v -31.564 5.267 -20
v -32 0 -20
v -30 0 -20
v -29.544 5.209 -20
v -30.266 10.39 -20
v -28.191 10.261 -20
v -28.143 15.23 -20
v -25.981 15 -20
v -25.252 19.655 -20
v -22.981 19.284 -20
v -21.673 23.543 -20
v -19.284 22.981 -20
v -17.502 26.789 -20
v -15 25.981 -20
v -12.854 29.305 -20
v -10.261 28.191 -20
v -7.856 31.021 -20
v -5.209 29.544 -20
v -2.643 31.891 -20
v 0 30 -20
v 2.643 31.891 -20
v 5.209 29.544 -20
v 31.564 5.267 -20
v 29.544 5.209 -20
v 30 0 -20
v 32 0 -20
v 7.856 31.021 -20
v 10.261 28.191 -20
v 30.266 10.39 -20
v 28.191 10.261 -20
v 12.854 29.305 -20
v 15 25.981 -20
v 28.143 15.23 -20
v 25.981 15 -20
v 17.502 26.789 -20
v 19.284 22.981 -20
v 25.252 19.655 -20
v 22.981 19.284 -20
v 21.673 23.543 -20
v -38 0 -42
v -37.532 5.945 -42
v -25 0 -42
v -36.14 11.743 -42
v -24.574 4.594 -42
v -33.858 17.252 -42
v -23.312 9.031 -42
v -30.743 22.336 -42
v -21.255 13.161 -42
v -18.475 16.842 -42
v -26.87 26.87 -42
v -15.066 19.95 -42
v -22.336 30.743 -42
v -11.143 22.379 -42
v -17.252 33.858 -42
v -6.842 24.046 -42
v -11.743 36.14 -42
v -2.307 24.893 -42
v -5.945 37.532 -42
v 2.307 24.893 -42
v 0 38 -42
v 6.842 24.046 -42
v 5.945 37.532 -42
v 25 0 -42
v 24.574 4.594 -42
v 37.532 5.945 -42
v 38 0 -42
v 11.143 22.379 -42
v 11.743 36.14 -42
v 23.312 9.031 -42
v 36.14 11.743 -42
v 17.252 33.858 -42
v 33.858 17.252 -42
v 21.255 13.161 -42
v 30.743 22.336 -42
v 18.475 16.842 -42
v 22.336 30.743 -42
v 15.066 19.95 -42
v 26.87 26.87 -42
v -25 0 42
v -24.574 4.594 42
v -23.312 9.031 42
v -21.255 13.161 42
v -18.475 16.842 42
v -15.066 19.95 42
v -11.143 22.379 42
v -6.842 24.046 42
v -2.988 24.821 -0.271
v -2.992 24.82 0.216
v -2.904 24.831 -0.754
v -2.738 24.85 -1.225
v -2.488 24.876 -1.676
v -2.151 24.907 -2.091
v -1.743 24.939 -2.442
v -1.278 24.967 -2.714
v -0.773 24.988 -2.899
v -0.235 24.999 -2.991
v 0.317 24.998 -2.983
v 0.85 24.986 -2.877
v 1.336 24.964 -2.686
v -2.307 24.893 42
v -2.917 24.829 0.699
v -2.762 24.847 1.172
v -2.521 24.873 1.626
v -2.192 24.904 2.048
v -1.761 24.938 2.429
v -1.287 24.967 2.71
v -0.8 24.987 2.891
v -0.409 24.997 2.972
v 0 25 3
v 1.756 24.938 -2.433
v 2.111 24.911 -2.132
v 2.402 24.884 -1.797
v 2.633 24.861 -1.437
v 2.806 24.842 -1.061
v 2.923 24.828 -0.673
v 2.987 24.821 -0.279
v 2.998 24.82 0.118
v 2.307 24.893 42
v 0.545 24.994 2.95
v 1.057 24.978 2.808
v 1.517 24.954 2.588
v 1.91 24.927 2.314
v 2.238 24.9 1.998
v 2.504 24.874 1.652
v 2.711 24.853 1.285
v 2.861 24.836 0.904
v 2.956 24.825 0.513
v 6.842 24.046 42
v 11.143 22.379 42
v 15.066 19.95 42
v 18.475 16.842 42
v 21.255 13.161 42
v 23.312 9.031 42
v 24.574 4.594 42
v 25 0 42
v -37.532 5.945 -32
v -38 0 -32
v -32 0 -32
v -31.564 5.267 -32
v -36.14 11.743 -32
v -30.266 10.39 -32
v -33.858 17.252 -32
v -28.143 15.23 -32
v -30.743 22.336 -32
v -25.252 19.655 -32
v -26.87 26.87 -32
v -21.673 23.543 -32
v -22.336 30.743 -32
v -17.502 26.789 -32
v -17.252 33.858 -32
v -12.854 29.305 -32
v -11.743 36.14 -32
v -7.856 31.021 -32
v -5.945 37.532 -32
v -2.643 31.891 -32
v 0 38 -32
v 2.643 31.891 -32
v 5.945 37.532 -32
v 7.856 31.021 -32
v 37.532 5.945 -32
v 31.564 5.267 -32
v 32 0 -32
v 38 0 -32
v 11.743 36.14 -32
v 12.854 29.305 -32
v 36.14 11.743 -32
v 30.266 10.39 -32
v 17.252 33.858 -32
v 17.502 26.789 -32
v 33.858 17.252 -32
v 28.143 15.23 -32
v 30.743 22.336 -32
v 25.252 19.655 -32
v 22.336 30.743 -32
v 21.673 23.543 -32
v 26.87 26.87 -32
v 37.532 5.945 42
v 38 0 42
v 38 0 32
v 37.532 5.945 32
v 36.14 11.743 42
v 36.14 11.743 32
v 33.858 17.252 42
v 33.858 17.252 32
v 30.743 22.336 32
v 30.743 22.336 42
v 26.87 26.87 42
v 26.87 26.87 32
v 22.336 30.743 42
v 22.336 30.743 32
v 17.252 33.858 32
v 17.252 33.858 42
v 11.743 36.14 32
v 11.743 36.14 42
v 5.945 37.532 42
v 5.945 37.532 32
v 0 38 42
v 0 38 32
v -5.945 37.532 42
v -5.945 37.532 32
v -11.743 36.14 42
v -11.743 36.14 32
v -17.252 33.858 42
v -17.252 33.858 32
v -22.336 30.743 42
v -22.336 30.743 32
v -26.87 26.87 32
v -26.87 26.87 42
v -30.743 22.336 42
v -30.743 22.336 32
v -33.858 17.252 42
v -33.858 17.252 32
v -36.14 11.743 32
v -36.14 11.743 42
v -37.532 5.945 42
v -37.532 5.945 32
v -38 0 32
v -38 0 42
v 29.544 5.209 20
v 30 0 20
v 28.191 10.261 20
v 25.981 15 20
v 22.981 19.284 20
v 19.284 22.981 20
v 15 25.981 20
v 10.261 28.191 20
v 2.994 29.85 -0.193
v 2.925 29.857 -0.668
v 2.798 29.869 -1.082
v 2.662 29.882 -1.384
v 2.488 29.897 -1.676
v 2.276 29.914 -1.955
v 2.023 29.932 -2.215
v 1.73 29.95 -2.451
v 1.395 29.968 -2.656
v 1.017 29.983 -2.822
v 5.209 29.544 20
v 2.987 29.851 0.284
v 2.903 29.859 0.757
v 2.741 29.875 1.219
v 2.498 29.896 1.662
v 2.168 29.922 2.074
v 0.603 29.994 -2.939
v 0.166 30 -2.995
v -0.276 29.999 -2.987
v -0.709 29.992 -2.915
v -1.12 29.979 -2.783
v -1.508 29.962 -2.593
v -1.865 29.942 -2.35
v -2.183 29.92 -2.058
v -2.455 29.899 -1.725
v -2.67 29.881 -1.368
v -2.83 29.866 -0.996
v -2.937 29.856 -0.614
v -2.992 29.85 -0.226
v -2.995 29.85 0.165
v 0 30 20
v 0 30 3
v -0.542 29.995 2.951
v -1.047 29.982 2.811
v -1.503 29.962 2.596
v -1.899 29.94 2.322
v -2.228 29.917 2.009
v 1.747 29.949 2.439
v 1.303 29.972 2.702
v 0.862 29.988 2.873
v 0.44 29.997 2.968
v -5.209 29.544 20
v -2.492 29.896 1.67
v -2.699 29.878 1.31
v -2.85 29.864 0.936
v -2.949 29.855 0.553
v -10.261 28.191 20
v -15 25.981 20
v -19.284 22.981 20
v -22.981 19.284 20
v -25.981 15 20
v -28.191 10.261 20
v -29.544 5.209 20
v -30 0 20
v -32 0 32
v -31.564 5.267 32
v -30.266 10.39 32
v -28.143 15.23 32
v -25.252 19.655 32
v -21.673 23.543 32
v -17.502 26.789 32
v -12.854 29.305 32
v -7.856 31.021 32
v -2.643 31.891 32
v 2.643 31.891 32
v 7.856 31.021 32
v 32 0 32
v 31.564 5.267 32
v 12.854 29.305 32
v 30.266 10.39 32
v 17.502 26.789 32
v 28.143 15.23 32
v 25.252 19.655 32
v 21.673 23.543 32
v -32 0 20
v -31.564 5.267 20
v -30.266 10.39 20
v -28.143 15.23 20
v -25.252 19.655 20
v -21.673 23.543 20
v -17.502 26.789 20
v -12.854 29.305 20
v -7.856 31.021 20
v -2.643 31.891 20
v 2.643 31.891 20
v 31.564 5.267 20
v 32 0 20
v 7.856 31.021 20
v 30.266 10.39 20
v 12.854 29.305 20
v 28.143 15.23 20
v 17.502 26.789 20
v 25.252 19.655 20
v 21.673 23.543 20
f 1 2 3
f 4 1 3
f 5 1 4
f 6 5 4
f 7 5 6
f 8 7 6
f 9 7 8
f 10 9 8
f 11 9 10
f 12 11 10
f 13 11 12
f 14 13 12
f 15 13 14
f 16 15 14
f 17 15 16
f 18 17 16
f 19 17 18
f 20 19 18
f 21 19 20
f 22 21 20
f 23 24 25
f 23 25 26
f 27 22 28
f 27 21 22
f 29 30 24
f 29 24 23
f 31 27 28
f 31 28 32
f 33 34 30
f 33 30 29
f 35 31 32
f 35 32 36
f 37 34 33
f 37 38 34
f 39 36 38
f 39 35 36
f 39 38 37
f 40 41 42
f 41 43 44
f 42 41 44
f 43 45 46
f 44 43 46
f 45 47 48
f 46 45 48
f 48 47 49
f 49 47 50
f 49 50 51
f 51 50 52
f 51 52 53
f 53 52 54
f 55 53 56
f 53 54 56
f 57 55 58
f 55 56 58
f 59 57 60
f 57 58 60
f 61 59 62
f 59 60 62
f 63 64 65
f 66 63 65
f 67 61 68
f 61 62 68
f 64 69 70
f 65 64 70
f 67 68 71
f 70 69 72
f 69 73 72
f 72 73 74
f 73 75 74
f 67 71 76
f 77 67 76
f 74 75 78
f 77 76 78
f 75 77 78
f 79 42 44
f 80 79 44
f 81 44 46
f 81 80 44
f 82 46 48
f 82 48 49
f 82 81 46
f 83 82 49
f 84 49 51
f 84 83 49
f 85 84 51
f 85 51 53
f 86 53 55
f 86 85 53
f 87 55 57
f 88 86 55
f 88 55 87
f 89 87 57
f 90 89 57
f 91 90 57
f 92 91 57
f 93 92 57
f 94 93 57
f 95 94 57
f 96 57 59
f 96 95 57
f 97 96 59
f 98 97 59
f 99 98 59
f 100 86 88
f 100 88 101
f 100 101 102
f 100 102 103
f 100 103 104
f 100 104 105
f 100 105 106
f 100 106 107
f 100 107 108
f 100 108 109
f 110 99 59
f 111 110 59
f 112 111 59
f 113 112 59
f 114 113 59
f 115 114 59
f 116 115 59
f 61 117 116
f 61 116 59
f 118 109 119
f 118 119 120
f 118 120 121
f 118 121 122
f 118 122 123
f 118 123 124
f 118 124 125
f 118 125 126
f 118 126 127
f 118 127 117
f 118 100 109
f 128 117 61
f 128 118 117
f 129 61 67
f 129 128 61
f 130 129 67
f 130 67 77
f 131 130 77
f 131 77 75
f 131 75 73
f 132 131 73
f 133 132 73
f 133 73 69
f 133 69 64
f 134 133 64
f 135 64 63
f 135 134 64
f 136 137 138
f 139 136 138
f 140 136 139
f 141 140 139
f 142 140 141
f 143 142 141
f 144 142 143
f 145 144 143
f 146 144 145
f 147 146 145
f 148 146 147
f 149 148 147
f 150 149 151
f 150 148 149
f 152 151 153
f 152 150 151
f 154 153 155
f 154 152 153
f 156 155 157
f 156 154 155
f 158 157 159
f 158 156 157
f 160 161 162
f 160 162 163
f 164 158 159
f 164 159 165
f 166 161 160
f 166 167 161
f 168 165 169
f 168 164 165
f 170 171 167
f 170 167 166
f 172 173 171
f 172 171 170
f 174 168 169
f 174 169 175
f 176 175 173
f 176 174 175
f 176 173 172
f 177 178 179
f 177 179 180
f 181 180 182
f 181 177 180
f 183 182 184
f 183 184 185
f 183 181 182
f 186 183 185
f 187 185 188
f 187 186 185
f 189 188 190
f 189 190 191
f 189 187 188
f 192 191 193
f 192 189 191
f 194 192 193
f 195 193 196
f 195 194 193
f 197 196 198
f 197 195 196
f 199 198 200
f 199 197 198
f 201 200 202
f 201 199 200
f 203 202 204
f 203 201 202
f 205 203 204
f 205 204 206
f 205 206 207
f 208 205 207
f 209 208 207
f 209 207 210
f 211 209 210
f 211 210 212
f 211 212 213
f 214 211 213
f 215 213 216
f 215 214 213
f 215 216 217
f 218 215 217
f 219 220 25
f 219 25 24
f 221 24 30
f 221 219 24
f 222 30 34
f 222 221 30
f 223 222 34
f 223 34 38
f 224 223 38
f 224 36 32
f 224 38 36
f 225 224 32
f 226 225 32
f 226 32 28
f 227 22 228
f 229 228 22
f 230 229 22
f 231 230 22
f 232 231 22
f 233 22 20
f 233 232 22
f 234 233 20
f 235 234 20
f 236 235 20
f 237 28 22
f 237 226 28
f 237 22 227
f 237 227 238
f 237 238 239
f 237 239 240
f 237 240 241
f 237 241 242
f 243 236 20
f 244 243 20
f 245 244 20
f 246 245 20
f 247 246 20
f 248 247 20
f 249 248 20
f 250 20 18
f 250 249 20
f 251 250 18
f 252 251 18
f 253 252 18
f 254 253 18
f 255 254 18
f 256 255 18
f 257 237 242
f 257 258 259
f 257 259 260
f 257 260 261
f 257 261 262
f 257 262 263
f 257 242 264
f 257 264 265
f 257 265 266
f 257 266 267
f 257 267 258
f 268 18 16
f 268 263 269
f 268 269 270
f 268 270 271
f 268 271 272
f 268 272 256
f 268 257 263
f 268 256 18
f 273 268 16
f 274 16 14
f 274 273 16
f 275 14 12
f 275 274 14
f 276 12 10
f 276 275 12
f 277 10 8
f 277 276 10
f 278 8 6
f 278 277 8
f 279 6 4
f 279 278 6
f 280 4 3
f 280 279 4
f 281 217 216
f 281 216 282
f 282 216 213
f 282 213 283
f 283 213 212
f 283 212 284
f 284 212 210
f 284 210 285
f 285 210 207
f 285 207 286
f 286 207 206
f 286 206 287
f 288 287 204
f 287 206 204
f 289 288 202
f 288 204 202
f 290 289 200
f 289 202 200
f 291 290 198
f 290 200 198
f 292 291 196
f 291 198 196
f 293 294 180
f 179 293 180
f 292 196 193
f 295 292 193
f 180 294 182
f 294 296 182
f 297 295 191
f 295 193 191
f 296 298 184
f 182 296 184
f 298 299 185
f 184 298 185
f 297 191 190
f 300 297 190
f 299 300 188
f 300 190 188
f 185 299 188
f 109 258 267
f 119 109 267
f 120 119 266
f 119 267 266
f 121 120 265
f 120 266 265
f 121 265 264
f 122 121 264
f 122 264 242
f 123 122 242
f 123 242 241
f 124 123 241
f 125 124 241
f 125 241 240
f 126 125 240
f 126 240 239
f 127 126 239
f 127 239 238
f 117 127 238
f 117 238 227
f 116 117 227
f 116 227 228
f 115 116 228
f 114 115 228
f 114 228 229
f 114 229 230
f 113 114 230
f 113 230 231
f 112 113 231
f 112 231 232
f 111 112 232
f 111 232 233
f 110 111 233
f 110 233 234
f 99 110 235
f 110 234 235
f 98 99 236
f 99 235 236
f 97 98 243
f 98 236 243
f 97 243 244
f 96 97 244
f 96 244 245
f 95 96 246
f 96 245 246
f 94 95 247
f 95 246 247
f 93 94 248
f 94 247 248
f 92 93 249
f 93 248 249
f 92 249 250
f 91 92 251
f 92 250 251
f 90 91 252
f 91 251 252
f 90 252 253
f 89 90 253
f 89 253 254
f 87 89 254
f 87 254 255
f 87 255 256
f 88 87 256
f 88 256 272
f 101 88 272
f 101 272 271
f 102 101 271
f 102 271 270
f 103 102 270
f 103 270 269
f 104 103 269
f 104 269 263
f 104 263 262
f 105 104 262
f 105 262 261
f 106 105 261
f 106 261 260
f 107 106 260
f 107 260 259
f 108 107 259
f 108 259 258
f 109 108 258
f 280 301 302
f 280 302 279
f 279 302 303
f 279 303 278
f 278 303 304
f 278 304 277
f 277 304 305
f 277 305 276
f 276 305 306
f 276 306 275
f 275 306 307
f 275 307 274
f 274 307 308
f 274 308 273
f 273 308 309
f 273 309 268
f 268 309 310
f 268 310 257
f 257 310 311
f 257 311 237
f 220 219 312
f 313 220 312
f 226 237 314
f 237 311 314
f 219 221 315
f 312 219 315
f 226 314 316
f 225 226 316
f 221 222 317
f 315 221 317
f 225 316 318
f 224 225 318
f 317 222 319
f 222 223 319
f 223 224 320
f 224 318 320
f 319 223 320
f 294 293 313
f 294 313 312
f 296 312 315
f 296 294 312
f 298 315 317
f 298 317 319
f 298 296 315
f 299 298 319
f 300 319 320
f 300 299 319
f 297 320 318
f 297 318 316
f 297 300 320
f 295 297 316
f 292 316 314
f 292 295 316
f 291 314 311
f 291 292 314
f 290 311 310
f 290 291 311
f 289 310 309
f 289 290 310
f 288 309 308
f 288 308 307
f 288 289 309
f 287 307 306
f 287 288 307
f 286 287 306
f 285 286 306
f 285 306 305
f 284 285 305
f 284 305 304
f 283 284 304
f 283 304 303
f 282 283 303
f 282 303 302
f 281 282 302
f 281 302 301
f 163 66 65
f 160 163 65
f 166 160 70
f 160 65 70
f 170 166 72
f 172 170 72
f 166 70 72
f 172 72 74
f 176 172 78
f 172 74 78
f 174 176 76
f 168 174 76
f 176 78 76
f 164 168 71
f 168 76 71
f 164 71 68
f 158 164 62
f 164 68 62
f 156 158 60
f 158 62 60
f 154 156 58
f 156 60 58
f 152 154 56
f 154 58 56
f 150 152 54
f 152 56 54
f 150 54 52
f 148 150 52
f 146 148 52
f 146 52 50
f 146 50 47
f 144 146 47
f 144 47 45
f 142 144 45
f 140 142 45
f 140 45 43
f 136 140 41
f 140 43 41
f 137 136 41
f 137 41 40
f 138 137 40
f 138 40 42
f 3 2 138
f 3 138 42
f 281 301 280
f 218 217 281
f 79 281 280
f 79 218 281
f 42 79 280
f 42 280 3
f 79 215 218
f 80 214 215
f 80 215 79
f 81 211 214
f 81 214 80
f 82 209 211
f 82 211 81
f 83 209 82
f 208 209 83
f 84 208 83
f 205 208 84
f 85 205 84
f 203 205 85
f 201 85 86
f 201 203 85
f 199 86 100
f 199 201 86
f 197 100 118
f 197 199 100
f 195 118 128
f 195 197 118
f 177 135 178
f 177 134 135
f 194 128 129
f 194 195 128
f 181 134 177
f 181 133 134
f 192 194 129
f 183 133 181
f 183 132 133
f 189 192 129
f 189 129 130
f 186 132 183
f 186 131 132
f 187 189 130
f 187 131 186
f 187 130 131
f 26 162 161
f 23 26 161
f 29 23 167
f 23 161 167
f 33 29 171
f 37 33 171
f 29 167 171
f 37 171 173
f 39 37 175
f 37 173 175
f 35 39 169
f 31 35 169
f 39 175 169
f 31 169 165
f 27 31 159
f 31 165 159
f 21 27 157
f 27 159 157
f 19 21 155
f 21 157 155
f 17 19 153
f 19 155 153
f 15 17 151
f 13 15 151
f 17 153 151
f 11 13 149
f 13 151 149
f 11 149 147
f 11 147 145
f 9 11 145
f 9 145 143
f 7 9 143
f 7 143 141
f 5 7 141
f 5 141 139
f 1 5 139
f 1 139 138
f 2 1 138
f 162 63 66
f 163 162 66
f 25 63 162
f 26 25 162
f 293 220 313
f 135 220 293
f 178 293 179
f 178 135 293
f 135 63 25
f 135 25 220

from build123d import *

# Parameters (mm, degrees)
REVOLVE1_START     = -42
REVOLVE1_DEPTH     = 42
REVOLVE1_2_DEPTH   = 10
REVOLVE1_START_2   = -32
REVOLVE1_3_DEPTH   = 12
SKETCH3_R          = 3
CUT_EXTRUDE1_DEPTH = 65.093681436


# Read off the part's stored shape, not the designer's step: Revolve1
with BuildPart() as part:
    # Revolve1 outline → Revolve1 (new body)
    with BuildSketch(Plane.XY.offset(REVOLVE1_START)):
        with BuildLine():
            ThreePointArc((-25, 0), (0, 25), (25, 0))
            Line((25, 0), (30, 0))
            ThreePointArc((30, 0), (0, 30), (-30, 0))
            Line((-30, 0), (-25, 0))
        make_face()
    revolve1 = extrude(amount=REVOLVE1_DEPTH)



with BuildPart() as body_2:
    # Revolve1 2 outline → Revolve1 2 (new body)
    with BuildSketch(Plane.XY.offset(REVOLVE1_START)):
        with BuildLine():
            ThreePointArc((-30, 0), (0, 30), (30, 0))
            Line((30, 0), (38, 0))
            ThreePointArc((38, 0), (0, 38), (-38, 0))
            Line((-38, 0), (-30, 0))
        make_face()
    revolve1_2 = extrude(amount=REVOLVE1_2_DEPTH)


with BuildPart() as part_1:
    add(part.part)

    add(body_2.part)  # Revolve1 3 merges body 2
    # Revolve1 3 outline → Revolve1 3 (add)
    with BuildSketch(Plane.XY.offset(REVOLVE1_START_2)):
        with BuildLine():
            ThreePointArc((-30, 0), (0, 30), (30, 0))
            Line((30, 0), (32, 0))
            ThreePointArc((32, 0), (0, 32), (-32, 0))
            Line((-32, 0), (-30, 0))
        make_face()
    revolve1_3 = extrude(amount=REVOLVE1_3_DEPTH)

    # Mirror1: Revolve1, Revolve1 2, Revolve1 3 across plane
    add(revolve1.mirror(Plane(origin=(30, 0, 0), x_dir=(1, 0, 0), z_dir=(0, 0, -1))))
    add(revolve1_2.mirror(Plane(origin=(30, 0, 0), x_dir=(1, 0, 0), z_dir=(0, 0, -1))))
    add(revolve1_3.mirror(Plane(origin=(30, 0, 0), x_dir=(1, 0, 0), z_dir=(0, 0, -1))))

    # Sketch3 → Cut-Extrude1 (cut, through all)
    with BuildSketch(Plane(origin=(0, 30, 0), x_dir=(1, 0, 0), z_dir=(0, 1, 0))):
        with Locations(Location((0, 0, 0), (0, 0, 270))):
            Circle(SKETCH3_R)
    extrude(amount=-CUT_EXTRUDE1_DEPTH, mode=Mode.SUBTRACT)


solid = part_1.part
